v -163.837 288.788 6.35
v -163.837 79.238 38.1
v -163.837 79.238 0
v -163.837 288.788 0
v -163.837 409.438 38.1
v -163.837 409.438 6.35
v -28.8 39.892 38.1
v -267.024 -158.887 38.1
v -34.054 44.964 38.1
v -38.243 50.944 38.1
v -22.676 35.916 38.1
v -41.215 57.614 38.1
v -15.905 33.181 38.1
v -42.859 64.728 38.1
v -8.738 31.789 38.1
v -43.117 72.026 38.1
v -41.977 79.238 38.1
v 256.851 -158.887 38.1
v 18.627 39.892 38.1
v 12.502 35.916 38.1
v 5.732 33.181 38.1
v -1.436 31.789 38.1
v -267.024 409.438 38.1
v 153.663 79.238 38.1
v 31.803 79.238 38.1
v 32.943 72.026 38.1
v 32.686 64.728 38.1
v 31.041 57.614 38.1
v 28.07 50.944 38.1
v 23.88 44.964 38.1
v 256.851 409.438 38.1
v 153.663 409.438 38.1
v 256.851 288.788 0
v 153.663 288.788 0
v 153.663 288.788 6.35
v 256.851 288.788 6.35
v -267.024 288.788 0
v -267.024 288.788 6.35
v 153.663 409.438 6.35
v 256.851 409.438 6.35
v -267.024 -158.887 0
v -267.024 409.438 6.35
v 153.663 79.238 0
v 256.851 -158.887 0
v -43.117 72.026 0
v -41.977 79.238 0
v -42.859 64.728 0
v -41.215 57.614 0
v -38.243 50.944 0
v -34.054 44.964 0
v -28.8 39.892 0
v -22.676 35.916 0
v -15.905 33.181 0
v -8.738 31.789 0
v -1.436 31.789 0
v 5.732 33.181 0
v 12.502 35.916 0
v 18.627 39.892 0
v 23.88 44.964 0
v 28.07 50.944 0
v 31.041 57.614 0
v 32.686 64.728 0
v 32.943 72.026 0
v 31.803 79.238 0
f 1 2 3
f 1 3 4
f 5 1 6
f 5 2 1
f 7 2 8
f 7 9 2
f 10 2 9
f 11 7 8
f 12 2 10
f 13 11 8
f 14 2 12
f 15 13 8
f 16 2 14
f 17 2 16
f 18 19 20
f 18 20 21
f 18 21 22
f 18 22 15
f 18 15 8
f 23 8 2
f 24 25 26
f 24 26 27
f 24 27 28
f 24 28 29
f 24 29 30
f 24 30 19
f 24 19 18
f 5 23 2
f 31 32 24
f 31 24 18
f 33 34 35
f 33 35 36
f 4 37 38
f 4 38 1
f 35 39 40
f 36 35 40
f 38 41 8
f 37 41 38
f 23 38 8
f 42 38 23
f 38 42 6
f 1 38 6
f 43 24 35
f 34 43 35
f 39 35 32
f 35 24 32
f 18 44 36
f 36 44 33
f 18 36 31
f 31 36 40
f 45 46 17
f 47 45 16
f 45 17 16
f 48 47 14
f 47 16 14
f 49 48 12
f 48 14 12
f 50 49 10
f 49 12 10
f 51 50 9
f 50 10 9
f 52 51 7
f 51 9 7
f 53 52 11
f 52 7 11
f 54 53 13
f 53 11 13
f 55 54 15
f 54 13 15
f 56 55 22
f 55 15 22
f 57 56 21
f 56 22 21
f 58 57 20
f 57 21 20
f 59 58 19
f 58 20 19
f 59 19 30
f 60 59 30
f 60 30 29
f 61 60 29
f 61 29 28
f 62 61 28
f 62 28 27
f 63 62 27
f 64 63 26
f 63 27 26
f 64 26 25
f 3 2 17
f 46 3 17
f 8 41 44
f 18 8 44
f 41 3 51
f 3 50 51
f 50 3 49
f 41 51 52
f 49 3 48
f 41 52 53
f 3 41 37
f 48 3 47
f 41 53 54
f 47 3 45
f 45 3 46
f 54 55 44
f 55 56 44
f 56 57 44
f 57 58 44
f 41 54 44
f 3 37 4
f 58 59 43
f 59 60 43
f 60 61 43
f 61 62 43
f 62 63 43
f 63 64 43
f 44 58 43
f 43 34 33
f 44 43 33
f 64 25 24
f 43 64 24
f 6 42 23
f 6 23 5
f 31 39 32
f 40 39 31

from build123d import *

# Parameters (mm, degrees)
F0_W     = 523.875
F0_H     = 568.325
F1_DEPTH = 38.1
F2_R     = 38.1
F3_DEPTH = 50.8
F4_W     = 317.5
F4_H     = 330.2
F5_DEPTH = 50.8
F6_W     = 896.055773
F6_H     = 120.65
F7_DEPTH = 6.35


with BuildPart() as f1:
    # F0 (on Top) → F1 (new body)
    with BuildSketch(Plane.XY):
        with Locations((-5.086774, 125.275676)):
            Rectangle(F0_W, F0_H)
    extrude(amount=F1_DEPTH)

    # F2 (on face) → F3 (cut)
    with BuildSketch(Plane.XY.offset(38.1)):
        with Locations((-5.086774, 69.713176)):
            Circle(F2_R)
    extrude(amount=-F3_DEPTH, mode=Mode.SUBTRACT)

    # F4 (on face) → F5 (cut)
    with BuildSketch(Plane.XY.offset(38.1)):
        with Locations((-5.086774, 244.338176)):
            Rectangle(F4_W, F4_H)
    extrude(amount=-F5_DEPTH, mode=Mode.SUBTRACT)

    # F6 (on face) → F7 (cut)
    with BuildSketch(Plane(origin=(0, 0, 0), x_dir=(1, 0, 0), z_dir=(0, 0, -1))):
        with Locations((-18.784851, -349.113176)):
            Rectangle(F6_W, F6_H)
    extrude(amount=-F7_DEPTH, mode=Mode.SUBTRACT)


solid = f1.part
